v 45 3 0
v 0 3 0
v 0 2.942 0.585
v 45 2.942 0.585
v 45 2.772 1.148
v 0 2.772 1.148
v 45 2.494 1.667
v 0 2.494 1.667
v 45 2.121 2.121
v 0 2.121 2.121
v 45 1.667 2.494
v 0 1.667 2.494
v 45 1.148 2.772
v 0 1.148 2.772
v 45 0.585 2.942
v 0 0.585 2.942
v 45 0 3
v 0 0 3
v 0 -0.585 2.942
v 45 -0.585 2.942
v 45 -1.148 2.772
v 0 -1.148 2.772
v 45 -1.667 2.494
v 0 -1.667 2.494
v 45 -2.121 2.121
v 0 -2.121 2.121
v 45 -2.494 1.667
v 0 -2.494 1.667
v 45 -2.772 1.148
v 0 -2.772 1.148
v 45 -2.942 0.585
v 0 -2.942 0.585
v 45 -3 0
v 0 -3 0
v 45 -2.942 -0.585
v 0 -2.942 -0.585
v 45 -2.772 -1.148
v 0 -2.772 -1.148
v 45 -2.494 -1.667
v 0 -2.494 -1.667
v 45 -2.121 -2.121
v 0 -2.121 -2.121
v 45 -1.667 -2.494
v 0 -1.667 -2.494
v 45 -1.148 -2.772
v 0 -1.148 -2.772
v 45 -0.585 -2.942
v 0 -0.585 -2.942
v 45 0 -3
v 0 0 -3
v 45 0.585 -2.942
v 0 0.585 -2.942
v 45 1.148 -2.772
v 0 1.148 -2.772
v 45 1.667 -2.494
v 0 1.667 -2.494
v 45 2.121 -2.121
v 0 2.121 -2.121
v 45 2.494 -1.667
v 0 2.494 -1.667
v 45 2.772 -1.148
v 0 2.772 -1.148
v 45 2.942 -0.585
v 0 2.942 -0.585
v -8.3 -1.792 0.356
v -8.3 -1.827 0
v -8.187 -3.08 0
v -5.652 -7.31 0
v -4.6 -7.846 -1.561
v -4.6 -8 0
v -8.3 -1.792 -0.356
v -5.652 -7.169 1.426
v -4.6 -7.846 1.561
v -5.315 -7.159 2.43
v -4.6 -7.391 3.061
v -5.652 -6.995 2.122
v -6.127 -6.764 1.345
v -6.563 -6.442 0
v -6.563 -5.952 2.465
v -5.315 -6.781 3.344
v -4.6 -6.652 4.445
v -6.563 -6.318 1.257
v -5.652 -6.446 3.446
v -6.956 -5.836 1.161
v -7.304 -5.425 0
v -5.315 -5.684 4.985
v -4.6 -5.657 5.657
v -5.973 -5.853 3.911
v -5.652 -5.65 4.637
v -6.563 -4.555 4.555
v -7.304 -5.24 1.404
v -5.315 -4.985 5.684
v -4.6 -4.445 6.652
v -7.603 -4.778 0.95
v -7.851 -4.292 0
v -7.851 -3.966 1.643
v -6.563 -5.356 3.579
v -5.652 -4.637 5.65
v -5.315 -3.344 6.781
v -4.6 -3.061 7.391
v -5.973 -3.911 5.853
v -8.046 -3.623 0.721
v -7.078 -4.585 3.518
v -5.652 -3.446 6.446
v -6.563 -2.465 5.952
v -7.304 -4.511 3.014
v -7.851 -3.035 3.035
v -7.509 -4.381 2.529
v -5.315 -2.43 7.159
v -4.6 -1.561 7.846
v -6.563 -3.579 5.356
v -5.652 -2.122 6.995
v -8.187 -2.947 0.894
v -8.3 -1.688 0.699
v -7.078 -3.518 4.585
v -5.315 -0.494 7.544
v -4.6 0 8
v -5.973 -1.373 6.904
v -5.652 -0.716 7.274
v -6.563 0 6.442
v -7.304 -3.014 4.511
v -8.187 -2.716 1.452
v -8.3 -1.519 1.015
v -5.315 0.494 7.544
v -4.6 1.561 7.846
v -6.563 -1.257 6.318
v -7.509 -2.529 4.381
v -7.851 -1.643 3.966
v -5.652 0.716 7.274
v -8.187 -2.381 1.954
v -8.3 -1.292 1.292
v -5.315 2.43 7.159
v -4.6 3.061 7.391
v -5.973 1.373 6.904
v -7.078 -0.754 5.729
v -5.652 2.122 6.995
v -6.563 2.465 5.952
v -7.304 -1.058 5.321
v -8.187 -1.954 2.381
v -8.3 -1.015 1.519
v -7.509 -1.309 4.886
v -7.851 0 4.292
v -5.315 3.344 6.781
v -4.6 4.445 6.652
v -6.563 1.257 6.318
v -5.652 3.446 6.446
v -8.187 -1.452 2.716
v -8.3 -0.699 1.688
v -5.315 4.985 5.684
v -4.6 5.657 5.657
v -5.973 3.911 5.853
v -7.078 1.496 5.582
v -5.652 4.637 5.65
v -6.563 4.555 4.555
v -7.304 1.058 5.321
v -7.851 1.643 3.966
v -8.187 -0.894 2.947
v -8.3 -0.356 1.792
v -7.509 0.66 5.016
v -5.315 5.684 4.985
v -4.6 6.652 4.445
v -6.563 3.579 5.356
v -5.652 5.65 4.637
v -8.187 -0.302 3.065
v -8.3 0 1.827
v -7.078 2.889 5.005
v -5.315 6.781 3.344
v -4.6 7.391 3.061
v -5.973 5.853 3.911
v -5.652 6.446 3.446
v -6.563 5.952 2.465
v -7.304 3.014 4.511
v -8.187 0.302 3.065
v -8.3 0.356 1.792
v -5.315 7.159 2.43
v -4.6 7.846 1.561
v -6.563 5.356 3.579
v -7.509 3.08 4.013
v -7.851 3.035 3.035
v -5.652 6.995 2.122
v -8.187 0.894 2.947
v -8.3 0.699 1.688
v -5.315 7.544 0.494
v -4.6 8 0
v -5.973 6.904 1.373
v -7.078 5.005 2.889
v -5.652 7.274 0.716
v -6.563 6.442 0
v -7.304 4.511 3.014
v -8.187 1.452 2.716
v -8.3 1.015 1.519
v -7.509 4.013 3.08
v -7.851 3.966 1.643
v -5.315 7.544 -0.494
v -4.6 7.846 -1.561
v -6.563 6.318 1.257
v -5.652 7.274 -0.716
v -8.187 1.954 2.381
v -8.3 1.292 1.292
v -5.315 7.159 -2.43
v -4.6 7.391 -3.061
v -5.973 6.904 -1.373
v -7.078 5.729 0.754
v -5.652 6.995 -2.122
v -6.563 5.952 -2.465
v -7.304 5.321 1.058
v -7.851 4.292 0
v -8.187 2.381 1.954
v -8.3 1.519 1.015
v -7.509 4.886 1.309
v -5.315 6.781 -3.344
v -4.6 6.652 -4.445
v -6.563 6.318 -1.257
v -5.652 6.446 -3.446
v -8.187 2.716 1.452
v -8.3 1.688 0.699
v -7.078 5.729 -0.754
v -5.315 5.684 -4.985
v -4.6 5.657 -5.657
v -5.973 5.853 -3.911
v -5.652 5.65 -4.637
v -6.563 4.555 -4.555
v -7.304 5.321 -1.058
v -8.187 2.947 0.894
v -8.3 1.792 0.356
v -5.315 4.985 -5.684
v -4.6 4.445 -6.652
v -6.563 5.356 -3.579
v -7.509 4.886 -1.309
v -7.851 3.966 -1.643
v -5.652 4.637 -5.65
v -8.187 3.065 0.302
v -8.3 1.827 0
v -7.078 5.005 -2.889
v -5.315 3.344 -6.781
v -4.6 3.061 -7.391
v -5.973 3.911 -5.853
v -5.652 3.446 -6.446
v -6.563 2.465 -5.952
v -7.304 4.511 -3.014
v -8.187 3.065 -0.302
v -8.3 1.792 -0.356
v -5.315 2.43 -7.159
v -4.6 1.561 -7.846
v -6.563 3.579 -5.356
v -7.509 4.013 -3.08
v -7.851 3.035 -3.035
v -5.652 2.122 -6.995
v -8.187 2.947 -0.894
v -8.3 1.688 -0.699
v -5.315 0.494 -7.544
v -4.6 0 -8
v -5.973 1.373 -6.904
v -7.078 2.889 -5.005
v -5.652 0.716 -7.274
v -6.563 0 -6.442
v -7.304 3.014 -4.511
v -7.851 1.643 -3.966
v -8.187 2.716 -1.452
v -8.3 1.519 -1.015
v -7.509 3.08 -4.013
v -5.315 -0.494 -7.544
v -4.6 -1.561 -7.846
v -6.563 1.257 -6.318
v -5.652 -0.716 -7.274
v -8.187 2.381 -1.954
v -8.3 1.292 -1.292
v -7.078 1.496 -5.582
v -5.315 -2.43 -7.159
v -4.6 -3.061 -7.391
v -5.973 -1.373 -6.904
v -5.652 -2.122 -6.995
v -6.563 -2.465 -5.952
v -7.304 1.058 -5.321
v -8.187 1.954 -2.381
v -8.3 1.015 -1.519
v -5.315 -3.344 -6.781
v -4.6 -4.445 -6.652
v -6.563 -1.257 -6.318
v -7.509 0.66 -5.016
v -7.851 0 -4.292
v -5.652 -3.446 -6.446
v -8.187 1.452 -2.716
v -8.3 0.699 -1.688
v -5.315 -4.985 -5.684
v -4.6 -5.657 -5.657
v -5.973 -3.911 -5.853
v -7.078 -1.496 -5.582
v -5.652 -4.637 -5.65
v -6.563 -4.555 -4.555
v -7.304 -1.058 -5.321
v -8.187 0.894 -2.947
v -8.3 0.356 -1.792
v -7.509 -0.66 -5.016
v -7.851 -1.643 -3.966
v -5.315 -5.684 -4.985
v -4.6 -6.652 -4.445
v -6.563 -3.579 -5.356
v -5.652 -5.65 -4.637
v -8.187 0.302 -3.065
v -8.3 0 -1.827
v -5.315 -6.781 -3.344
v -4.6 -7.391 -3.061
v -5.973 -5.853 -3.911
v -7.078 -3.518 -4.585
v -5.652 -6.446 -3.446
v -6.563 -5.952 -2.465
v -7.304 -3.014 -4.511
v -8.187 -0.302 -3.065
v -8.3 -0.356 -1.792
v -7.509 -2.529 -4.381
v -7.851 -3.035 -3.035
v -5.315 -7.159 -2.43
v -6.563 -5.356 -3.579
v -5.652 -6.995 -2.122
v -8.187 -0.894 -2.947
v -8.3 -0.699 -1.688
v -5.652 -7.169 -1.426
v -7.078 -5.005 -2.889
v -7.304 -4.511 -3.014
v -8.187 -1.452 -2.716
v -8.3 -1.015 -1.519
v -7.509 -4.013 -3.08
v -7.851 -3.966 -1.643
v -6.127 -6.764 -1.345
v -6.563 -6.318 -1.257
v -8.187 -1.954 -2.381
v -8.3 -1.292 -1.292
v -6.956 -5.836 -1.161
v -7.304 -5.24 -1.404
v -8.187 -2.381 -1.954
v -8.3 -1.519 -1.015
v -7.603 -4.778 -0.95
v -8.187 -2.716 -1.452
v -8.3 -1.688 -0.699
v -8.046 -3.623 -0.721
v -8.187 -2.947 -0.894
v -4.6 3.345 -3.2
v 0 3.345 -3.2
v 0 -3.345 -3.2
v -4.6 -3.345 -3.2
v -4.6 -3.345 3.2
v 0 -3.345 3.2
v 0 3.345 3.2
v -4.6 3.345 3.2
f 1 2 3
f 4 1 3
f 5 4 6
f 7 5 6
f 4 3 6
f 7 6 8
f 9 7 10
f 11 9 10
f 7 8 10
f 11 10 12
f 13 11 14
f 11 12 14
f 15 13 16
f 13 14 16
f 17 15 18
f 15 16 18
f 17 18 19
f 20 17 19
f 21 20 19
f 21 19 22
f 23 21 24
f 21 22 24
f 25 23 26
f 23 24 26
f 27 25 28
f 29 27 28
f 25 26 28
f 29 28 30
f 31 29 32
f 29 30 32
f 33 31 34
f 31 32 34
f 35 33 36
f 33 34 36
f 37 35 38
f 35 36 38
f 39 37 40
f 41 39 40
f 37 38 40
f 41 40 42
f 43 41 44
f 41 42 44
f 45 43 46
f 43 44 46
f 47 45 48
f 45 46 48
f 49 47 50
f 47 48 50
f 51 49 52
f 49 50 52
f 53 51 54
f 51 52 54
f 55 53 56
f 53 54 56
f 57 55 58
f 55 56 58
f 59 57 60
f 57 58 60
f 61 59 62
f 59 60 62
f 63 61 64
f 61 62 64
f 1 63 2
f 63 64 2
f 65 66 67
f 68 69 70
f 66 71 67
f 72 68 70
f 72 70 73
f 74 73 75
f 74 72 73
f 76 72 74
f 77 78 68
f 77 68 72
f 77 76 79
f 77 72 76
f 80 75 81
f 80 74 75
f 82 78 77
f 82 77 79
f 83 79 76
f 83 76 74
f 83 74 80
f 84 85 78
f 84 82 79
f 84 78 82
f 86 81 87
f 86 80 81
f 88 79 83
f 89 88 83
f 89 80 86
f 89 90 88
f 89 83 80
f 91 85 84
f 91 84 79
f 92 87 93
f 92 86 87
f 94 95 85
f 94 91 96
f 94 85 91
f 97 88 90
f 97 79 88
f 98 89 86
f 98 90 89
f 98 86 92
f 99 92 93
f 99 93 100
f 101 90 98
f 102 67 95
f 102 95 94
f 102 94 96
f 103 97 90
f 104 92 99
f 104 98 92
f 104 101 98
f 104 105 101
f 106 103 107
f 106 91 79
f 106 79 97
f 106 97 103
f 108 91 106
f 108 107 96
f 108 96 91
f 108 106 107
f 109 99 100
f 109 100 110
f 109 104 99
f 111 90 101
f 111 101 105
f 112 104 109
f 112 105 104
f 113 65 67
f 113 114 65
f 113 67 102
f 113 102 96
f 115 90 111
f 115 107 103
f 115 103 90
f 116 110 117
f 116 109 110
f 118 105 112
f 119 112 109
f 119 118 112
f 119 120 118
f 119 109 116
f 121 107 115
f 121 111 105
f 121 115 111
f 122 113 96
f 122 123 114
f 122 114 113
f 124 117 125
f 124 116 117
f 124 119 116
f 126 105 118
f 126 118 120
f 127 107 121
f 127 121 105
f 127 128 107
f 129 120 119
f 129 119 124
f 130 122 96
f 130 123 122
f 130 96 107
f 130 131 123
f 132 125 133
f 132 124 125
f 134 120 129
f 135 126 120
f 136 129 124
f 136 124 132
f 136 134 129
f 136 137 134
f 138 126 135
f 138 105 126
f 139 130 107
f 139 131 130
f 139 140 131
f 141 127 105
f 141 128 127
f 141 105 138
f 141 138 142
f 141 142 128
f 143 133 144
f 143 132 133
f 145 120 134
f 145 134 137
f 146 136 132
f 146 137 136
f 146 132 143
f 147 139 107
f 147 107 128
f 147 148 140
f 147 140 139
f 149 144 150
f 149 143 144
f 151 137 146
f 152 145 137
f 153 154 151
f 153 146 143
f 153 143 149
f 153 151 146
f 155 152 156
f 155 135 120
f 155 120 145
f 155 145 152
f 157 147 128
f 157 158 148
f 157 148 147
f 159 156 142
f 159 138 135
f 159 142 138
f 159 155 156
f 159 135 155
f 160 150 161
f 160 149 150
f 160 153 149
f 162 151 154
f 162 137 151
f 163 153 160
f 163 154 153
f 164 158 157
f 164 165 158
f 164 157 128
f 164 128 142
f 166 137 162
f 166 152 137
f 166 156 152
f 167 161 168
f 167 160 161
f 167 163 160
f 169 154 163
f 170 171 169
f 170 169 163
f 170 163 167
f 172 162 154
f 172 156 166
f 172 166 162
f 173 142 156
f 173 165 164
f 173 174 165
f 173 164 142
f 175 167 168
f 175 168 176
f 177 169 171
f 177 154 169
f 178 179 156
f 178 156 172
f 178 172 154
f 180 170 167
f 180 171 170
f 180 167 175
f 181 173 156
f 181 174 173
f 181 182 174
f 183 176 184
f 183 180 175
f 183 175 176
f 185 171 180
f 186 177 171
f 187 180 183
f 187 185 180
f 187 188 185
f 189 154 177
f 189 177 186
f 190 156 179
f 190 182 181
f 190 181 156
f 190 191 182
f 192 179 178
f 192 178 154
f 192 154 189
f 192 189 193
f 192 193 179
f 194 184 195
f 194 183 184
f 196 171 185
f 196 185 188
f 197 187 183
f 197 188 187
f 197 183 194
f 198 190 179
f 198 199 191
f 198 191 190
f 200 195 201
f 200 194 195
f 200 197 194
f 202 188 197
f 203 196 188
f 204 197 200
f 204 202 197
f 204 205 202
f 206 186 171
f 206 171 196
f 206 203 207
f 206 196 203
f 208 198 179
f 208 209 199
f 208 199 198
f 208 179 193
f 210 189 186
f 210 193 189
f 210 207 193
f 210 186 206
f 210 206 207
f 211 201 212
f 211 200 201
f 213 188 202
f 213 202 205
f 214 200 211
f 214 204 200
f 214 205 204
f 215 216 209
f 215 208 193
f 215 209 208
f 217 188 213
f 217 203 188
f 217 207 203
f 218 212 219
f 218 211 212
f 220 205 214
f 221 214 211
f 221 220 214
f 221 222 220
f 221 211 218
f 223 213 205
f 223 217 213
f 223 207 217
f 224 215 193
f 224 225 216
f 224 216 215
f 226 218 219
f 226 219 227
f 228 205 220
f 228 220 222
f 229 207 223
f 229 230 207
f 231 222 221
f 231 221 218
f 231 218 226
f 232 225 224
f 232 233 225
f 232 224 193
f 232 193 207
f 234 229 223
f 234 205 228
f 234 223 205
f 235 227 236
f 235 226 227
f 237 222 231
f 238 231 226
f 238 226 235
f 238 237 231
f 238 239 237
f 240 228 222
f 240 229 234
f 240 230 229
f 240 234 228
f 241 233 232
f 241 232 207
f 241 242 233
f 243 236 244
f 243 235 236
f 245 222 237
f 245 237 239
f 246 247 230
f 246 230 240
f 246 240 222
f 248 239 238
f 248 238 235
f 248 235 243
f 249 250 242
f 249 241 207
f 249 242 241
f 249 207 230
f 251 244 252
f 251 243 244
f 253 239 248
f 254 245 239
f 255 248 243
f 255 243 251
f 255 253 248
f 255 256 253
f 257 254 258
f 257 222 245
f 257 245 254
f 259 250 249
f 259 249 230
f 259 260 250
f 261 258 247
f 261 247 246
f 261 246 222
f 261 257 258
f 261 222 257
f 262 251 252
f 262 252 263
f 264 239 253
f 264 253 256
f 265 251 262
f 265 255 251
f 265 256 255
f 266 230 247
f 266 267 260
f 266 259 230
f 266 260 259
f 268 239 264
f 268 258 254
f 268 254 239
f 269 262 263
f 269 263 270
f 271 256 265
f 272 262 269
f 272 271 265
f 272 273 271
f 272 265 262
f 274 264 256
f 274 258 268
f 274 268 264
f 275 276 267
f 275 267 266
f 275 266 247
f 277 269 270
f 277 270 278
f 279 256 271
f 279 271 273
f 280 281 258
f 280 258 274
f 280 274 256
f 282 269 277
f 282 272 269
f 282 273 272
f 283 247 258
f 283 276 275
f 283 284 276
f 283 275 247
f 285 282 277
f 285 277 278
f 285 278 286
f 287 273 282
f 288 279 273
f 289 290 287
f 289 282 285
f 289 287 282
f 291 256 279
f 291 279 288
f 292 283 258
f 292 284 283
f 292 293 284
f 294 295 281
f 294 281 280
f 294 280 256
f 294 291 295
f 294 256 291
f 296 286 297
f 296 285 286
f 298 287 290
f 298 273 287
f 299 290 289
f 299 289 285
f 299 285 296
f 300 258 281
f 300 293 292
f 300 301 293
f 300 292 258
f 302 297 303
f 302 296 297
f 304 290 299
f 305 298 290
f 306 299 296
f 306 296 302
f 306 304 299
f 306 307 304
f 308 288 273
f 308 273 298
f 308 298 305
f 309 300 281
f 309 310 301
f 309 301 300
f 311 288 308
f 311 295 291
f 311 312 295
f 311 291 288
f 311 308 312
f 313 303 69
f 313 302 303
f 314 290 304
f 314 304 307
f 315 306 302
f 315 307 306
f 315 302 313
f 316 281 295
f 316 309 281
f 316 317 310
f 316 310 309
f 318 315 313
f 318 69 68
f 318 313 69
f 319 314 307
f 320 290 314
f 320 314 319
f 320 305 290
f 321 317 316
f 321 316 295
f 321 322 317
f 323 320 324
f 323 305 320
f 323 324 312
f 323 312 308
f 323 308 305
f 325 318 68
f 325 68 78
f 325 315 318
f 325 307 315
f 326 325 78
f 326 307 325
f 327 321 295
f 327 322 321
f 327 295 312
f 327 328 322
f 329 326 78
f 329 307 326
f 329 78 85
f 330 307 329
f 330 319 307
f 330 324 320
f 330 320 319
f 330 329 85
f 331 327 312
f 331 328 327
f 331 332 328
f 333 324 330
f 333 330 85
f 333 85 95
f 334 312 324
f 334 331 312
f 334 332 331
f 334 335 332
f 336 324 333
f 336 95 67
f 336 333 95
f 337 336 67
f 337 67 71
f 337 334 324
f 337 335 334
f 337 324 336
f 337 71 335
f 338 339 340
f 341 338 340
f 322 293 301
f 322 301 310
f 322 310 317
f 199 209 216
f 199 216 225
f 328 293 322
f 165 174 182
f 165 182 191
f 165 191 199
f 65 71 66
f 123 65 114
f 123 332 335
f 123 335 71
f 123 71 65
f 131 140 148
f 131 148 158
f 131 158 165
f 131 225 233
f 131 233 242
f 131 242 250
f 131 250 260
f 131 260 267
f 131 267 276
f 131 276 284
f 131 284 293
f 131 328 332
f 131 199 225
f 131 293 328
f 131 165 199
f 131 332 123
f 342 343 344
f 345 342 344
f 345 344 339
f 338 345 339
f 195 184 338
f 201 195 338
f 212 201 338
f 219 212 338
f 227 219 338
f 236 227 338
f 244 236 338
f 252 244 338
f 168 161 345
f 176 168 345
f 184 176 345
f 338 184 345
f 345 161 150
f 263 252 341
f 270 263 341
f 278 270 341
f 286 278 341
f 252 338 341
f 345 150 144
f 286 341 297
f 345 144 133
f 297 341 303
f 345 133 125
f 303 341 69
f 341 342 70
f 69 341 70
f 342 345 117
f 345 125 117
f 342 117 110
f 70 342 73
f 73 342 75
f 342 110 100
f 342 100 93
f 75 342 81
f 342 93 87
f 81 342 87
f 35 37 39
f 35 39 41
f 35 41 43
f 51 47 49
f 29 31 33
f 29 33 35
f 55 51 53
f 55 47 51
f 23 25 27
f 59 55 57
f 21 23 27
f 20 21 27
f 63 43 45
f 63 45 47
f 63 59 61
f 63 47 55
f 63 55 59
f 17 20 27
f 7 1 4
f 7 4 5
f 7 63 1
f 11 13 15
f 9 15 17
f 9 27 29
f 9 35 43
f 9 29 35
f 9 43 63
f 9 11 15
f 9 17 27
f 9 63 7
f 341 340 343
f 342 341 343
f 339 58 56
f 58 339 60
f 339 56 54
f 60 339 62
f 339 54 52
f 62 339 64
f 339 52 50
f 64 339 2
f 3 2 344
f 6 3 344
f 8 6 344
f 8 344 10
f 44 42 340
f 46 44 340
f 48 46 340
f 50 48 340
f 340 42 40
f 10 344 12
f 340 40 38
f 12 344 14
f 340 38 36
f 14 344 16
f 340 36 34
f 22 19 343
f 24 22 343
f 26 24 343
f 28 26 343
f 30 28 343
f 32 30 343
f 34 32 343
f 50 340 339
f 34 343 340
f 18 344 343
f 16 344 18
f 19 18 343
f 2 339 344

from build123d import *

# Parameters (mm, degrees)
F0_R     = 3
F1_DEPTH = 45
F2_W     = 3.3454523287
F2_H     = 3.2
F3_DEPTH = 4.6
F4_R     = 8
F5_DEPTH = 3.7


# Not quite as in the source:
# - a fillet or chamfer that OpenCascade refuses, or shapes differently, is made with other operations: its cross-section is extruded or revolved along the edge and cut away or added


with BuildPart() as f1:
    # F0 (on Right) → F1 (new body)
    with BuildSketch(Plane.YZ):
        Circle(F0_R)
    extrude(amount=F1_DEPTH)

    # F2 (on face) → F3 (join)
    with BuildSketch(Plane(origin=(0, 0, 0), x_dir=(0, -1, 0), z_dir=(-1, 0, 0))):
        with Locations((-1.6727261643, -1.6)):
            Rectangle(F2_W, F2_H)
        with Locations((-1.6727261643, 1.6)):
            Rectangle(F2_W, F2_H)
        Polygon((0, 3.2), (0, 0), (0, -3.2), (3.3454523287, -3.2), (3.3454523287, 0), (3.3454523287, 3.2), align=None)
    extrude(amount=F3_DEPTH)

    # F4 (on face) → F5 (join)
    with BuildSketch(Plane(origin=(-4.6, 0, 0), x_dir=(0, -1, 0), z_dir=(-1, 0, 0))):
        Circle(F4_R)
    extrude(amount=F5_DEPTH)

    # F6: fillet of radius 7 on 1 edges, made by hand

    # F6_s1 → F6_t2 (revolve, cut)
    with BuildSketch(Plane.XY):
        with BuildLine():
            ThreePointArc((-4.6, -8), (-7.3041652209, -5.4252811095), (-8.3, -1.8266702664))
            Line((-8.3, -1.8266702664), (-8.3, -8))
            Line((-8.3, -8), (-4.6, -8))
        make_face()
    revolve(axis=Axis((-8.3, 0, 0), (-1, 0, 0)), mode=Mode.SUBTRACT)


solid = f1.part
